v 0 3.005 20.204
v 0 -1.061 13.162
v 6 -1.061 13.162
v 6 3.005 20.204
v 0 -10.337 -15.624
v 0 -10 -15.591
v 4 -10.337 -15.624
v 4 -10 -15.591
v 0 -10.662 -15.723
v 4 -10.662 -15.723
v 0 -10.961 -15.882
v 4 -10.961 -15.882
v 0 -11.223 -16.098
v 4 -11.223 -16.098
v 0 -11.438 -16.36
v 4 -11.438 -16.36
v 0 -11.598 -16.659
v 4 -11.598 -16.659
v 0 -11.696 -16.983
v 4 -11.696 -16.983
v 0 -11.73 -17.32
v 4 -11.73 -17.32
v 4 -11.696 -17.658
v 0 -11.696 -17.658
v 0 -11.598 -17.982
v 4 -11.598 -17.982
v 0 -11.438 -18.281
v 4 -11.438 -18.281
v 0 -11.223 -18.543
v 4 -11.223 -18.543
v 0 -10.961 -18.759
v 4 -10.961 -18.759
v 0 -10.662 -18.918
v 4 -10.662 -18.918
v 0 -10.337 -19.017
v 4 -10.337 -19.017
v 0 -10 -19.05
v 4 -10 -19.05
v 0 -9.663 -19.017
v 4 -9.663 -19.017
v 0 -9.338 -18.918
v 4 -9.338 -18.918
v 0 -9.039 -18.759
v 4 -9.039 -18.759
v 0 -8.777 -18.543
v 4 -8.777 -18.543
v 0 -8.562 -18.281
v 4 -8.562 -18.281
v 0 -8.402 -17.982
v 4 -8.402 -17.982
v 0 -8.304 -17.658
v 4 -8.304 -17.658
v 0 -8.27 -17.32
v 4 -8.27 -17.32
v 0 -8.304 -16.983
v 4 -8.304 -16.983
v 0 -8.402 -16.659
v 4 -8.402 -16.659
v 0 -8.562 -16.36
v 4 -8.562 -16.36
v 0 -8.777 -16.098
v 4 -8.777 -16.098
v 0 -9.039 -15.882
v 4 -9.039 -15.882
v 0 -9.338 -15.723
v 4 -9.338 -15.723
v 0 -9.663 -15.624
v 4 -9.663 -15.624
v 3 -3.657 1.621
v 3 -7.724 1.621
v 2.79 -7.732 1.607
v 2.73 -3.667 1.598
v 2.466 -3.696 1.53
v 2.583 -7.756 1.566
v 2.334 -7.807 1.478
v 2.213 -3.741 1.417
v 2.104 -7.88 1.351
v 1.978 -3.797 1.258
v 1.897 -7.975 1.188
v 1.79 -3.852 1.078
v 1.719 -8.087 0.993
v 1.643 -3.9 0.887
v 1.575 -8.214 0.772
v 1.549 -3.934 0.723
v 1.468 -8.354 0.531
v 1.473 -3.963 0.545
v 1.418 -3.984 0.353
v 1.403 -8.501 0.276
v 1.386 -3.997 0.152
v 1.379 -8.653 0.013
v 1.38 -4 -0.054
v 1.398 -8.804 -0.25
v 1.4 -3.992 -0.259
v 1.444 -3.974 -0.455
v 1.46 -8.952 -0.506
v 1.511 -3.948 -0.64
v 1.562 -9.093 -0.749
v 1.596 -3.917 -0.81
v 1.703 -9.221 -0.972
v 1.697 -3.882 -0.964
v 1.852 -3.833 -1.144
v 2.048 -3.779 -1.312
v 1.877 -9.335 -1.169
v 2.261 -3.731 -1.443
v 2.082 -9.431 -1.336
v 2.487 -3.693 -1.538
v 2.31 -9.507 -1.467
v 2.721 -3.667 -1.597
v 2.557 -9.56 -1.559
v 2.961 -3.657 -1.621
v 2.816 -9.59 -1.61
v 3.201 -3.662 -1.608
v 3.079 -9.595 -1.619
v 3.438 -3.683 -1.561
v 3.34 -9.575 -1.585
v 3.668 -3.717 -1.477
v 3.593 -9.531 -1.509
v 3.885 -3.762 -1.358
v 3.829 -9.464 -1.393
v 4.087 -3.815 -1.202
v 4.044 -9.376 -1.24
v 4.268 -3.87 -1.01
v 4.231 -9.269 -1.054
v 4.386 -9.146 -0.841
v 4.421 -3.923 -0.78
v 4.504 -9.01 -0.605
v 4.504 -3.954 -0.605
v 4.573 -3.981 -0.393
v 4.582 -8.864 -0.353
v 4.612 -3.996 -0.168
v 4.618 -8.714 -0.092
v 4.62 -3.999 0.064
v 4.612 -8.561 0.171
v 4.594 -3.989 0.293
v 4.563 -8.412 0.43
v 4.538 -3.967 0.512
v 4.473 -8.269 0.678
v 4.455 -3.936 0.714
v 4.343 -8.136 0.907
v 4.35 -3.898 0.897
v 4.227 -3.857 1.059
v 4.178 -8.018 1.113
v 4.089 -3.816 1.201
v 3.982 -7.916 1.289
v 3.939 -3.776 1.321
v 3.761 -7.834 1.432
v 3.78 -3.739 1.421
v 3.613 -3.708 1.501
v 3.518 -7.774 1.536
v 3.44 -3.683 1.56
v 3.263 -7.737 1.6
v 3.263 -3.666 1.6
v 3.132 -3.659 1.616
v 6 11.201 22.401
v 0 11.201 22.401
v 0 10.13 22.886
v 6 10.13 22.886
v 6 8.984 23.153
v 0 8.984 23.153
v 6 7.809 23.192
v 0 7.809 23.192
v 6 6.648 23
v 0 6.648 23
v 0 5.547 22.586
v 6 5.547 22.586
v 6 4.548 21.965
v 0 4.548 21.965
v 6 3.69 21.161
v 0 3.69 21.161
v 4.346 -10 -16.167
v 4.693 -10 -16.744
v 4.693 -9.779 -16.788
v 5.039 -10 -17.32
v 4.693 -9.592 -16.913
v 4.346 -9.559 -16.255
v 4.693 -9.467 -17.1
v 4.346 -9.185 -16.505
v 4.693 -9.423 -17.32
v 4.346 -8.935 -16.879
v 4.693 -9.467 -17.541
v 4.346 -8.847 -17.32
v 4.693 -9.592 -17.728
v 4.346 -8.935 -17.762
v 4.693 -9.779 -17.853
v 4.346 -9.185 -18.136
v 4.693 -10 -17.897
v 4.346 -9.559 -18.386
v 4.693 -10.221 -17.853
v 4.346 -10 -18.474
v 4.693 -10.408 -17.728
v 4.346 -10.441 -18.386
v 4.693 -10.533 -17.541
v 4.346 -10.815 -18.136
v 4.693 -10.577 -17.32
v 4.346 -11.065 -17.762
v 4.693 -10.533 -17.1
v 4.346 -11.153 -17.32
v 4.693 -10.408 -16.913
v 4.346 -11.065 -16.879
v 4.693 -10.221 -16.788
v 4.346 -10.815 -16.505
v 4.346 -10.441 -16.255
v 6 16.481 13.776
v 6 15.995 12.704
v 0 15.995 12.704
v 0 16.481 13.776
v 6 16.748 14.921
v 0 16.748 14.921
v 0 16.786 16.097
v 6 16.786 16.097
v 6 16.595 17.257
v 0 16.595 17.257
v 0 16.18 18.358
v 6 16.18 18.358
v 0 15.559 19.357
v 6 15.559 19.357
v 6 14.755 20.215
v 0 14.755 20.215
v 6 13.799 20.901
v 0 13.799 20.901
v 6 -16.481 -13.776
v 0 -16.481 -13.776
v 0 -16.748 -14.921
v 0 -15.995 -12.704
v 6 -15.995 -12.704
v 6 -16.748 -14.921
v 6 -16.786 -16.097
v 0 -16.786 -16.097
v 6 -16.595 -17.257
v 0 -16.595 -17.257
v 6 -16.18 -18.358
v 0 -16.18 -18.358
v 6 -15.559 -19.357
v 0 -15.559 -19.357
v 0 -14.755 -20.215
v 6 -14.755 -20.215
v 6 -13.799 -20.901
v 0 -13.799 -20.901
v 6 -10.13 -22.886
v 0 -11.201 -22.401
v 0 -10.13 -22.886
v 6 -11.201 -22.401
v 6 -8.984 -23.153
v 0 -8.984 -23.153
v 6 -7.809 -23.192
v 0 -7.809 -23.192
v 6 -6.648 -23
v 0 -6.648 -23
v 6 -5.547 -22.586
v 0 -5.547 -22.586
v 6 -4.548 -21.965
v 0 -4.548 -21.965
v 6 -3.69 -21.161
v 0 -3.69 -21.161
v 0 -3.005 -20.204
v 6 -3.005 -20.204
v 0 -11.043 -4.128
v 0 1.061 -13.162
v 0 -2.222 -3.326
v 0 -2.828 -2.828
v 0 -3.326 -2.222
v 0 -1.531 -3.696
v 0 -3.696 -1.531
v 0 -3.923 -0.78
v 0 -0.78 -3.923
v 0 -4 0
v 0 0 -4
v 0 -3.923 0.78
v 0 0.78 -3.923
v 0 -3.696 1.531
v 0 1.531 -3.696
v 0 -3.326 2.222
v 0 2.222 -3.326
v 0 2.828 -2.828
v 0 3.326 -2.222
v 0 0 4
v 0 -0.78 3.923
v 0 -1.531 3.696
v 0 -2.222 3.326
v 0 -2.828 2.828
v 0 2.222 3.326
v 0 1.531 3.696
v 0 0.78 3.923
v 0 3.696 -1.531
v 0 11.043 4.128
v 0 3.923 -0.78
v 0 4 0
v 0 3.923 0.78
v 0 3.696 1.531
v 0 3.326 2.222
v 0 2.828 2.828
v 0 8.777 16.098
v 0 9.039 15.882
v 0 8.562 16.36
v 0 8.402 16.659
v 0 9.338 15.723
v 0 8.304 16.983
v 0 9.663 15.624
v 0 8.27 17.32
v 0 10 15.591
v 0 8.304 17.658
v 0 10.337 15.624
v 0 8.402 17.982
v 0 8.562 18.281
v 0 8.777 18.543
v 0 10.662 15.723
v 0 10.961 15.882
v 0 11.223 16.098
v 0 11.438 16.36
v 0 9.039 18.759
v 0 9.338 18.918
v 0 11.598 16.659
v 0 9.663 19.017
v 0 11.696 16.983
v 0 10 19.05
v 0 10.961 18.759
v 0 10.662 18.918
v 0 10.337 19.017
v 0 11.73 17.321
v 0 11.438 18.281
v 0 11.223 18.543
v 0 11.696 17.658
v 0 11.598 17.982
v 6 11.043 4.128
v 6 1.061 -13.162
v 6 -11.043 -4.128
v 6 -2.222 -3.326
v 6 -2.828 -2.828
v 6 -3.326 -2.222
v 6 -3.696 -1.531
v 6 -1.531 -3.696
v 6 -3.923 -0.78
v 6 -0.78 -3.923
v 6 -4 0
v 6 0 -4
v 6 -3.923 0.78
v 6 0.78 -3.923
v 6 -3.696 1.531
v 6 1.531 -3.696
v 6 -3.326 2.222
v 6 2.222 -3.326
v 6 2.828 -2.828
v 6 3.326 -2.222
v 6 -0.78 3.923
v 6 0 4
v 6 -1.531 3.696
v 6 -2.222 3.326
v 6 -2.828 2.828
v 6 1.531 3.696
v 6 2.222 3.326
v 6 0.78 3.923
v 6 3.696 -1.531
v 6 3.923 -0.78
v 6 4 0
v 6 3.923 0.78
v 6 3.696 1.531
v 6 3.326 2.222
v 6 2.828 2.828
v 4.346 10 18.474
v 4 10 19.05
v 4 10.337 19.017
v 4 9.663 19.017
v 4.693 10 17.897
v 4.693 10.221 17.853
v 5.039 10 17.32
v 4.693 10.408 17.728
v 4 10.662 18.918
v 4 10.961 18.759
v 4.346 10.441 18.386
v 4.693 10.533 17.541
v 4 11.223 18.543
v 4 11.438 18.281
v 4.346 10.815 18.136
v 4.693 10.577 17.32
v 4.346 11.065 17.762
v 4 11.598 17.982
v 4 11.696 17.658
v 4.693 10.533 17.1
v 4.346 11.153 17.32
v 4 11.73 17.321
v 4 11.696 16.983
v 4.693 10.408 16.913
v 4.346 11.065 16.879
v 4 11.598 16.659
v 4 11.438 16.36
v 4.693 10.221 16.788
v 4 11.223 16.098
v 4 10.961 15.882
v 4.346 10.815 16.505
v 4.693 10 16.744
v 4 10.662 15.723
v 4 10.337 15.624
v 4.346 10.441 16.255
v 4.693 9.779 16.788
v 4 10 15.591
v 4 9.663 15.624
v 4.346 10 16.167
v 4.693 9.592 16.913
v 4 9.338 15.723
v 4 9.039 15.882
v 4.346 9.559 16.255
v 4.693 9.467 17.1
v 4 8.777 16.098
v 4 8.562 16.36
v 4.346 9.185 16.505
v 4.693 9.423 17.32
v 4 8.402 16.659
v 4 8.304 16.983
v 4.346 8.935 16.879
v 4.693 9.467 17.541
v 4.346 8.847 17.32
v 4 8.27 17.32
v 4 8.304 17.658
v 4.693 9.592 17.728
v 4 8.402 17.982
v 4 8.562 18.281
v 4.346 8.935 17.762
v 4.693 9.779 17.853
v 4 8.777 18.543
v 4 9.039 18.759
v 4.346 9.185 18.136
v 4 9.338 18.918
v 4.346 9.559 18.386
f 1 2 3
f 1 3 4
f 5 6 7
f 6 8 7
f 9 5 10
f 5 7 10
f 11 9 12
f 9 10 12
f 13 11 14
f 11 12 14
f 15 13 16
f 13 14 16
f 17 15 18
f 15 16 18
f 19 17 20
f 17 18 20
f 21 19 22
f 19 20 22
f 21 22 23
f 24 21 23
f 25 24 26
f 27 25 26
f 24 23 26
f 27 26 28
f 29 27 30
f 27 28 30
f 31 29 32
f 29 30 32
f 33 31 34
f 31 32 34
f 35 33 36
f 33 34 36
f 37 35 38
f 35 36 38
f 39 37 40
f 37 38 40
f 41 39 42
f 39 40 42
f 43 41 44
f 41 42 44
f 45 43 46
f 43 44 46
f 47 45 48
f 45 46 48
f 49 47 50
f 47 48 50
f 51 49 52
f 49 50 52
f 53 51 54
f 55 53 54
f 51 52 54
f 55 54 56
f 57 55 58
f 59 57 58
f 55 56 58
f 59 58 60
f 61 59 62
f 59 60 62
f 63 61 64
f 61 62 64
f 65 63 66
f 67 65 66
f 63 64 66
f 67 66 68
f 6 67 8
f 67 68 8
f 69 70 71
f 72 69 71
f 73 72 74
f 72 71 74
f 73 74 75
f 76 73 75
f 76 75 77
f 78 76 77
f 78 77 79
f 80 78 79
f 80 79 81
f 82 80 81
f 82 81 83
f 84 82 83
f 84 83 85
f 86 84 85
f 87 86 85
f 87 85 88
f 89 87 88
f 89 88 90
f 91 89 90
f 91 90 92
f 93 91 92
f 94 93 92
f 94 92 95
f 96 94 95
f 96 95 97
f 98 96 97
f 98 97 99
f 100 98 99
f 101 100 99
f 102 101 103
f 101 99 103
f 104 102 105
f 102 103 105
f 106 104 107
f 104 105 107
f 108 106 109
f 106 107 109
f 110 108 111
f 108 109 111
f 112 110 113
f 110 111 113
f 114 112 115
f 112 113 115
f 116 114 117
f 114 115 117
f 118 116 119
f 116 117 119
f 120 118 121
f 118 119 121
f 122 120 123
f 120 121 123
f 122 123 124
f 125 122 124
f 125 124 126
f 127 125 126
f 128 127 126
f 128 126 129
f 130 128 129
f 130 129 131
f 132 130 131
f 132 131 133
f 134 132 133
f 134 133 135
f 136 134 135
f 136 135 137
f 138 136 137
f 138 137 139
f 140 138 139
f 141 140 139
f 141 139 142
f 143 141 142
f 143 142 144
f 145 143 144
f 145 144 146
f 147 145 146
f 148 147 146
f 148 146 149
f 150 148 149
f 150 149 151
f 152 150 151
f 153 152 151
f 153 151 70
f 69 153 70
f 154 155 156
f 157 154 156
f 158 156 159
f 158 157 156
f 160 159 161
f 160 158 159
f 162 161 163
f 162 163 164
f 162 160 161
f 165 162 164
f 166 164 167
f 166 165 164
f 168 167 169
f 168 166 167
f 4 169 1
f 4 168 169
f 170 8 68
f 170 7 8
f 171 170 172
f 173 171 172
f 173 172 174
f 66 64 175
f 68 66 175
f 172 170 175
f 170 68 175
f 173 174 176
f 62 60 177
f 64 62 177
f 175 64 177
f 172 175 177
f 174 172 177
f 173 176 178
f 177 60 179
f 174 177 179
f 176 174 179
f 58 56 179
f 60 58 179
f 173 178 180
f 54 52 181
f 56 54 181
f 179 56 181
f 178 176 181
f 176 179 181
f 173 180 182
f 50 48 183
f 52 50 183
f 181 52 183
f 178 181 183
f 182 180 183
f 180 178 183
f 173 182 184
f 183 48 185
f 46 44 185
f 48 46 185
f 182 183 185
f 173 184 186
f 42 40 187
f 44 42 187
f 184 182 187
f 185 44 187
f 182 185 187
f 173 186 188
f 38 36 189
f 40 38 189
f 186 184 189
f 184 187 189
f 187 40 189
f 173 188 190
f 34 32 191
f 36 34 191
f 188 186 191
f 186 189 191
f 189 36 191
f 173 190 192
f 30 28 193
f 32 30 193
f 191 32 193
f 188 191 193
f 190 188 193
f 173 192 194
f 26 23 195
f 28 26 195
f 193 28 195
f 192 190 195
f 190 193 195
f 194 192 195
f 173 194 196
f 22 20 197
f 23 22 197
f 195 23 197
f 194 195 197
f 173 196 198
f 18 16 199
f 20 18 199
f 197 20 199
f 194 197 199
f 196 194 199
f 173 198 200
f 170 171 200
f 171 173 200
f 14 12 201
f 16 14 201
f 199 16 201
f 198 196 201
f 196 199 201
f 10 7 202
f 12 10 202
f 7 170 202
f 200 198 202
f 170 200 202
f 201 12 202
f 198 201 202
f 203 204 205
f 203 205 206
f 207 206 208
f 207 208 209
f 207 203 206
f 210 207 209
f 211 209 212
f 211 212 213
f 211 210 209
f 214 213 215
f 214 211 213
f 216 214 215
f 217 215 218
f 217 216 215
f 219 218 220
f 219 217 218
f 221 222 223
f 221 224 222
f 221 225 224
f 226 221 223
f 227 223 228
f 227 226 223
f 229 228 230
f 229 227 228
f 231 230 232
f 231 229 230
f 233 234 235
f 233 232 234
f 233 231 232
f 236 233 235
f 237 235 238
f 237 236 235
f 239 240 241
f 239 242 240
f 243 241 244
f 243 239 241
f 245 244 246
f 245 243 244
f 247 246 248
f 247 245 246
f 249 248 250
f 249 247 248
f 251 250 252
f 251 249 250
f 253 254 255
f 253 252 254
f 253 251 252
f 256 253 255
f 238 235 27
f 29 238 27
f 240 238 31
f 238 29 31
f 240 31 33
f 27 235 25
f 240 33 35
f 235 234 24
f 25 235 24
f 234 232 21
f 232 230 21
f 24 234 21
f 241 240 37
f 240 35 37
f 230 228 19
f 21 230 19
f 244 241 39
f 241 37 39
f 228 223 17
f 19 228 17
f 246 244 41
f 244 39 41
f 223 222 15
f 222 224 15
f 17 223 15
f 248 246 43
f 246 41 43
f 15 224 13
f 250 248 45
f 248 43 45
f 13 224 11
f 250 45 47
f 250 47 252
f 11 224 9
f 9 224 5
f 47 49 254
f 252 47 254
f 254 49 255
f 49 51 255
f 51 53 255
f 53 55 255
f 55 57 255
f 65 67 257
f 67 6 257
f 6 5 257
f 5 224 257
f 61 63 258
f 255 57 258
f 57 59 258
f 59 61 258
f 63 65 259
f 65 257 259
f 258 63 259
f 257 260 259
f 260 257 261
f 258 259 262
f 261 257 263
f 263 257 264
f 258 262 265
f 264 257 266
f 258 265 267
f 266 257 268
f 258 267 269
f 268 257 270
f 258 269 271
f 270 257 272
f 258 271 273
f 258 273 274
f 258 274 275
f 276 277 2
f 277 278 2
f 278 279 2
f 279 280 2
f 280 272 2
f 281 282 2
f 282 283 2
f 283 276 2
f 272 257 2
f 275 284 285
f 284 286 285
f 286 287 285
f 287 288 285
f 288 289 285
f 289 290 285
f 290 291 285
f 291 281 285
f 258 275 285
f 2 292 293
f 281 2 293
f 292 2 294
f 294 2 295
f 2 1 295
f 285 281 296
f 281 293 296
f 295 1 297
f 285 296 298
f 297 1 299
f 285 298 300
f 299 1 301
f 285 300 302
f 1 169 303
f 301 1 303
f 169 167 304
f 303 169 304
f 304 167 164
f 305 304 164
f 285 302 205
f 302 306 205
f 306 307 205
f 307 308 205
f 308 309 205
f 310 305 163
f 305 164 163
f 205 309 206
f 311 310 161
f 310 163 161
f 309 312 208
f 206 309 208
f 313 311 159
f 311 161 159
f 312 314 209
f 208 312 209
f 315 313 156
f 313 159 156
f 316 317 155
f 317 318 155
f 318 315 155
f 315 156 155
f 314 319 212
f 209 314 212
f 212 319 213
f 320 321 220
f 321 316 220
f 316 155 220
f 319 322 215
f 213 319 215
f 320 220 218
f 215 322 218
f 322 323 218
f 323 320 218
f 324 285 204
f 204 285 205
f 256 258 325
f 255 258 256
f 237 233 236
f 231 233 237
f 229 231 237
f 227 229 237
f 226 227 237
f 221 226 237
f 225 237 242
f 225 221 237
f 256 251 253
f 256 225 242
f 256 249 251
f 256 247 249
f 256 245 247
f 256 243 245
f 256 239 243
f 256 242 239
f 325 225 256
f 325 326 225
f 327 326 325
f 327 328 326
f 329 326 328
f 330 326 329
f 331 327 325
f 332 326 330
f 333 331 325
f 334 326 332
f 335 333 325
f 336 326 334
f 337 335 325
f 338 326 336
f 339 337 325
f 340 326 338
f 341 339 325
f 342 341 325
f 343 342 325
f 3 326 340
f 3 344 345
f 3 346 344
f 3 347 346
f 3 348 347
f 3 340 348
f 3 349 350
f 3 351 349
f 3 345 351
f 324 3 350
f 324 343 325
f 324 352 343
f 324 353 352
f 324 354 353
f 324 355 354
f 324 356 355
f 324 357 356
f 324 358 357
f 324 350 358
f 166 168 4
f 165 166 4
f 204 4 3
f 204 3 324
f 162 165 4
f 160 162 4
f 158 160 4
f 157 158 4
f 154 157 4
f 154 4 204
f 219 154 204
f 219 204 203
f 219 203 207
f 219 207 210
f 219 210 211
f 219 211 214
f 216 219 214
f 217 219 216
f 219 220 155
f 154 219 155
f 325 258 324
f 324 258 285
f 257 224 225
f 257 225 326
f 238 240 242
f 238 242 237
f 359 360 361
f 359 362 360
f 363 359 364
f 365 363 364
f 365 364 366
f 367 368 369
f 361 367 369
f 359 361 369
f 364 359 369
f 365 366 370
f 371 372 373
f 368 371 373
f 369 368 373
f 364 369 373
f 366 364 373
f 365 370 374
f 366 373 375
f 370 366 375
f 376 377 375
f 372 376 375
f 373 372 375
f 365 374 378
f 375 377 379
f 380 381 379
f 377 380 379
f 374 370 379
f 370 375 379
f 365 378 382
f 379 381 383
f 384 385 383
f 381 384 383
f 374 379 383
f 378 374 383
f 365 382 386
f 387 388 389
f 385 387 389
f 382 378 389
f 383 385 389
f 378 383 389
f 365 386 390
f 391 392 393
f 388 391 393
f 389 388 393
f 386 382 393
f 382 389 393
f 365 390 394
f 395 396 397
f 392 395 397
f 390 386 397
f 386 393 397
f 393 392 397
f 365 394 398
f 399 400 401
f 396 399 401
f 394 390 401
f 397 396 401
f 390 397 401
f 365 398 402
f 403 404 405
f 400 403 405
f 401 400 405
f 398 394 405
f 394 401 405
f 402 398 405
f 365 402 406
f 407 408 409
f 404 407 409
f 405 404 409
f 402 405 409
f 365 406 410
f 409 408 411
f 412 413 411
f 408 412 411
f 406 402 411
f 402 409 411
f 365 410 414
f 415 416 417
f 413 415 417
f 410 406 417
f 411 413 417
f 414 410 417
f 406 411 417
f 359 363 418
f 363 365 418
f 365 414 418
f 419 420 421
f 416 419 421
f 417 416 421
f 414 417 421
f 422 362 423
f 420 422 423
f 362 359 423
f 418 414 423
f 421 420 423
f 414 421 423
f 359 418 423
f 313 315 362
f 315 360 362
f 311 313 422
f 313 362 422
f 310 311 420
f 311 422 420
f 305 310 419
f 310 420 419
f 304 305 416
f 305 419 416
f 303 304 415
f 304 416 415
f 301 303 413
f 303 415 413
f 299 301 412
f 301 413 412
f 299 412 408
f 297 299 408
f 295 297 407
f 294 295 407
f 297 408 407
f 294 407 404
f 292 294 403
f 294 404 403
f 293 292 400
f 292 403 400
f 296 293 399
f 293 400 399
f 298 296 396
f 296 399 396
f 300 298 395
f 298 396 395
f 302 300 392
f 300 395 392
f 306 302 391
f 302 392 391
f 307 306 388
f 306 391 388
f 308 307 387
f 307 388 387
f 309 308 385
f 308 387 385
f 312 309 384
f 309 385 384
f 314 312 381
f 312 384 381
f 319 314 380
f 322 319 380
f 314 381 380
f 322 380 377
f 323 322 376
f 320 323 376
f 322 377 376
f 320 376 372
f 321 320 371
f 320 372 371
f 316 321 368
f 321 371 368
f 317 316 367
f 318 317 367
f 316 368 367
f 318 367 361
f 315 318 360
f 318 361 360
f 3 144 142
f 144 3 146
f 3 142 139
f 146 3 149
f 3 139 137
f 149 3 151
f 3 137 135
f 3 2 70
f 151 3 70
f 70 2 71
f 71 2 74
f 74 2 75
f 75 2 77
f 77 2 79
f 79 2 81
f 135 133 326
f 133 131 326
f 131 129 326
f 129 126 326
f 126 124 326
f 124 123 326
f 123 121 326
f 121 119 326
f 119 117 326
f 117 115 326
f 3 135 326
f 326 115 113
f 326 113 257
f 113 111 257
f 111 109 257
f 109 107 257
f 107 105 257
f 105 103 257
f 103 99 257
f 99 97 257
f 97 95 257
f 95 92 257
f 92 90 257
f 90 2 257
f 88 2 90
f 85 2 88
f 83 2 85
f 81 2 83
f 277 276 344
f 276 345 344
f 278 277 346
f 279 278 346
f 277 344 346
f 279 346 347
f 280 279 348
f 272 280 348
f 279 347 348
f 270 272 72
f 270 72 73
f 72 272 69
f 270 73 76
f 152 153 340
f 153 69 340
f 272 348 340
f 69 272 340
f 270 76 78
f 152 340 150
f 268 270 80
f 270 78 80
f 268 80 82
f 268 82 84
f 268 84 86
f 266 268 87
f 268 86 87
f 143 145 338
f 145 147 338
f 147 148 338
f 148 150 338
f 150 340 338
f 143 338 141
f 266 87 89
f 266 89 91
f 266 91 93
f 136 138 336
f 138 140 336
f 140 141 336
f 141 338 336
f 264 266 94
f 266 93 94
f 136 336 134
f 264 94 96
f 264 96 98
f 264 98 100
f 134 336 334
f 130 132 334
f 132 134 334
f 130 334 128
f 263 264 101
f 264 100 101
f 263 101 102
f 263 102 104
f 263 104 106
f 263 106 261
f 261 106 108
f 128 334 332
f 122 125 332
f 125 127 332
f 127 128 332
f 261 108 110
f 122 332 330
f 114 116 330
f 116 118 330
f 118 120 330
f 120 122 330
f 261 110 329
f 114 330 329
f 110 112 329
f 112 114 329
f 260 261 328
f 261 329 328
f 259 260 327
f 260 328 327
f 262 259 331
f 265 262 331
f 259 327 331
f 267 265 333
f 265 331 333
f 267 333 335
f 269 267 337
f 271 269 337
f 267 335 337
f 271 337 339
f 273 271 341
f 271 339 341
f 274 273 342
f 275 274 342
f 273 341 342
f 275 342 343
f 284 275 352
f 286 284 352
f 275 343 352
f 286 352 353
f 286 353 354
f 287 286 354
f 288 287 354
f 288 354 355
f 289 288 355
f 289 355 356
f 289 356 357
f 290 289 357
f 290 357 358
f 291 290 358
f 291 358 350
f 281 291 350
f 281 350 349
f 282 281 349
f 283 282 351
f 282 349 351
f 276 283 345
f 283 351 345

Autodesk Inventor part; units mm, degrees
ref_plane "YZ Plane" through (0, 0, 0) normal (1, 0, 0) x (0, 1, 0)
ref_plane "XZ Plane" through (0, 0, 0) normal (0, 1, 0) x (-1, 0, 0)
ref_plane "XY Plane" through (0, 0, 0) normal (0, 0, 1) x (1, 0, 0)
sketch "Sketch1" plane through (0, 0, 0) normal (1, 0, 0) x (0, 1, 0)
  line L0 (1.0612, -13.162) -> (11.0434, 4.1278)
  line L1 (-1.0612, 13.162) -> (-11.0434, -4.1278)
  line L2 (6.0523, -4.5171) -> (-6.0523, 4.5171) construction
  line L3 (-26.5933, 0) -> (26.5933, 0) construction
  line L4 (0, -35.5609) -> (0, 35.5609) construction
  line L5 (11.0434, 4.1278) -> (18.9952, 17.9006)
  line L6 (18.9952, 17.9006) -> (6.0048, 25.4006)
  line L7 (-1.0612, 13.162) -> (6.0048, 25.4006)
  line L8 (1.0612, -13.162) -> (-6.0048, -25.4006)
  line L9 (-6.0048, -25.4006) -> (-18.9952, -17.9006)
  line L10 (-18.9952, -17.9006) -> (-11.0434, -4.1278)
  point P0 (0, 0)
  dimension "d1" = 15
  dimension "d2" = 50
  dimension "d4" = 60
extrude "Extrusion1" add sketch "Sketch1" along normal blind 6
sketch "Sketch2" plane through (0, 0, 0) normal (-1, 0, 0) x (0, 0, 1)
  point P0 (0, 0)
hole "Hole1" at (0, 0, 0) direction (1, 0, 0) diameter 8 end through all
sketch "Sketch3" plane through (0, 0, 0) normal (0, 1, 0) x (-1, 0, 0)
  line L0 (-6, -25.4006) -> (-6, 17.9006) construction
  line L1 (0, -25.4006) -> (0, 17.9006) construction
  line L2 (1.2, 0) -> (-7.2, 0) construction
  line L3 (0, 0) -> (-6, 0) construction
  point P0 (-6, -17.5083)
  point P1 (-6, 5.0083)
  point P2 (0, 5.0083)
  point P3 (0, -17.5083)
  point P4 (-3, 0)
  point P5 (-3, 0)
hole "Hole2" at (3, 0, 0) direction (0, -1, 0) diameter 3.242 end through all thread size "M4x0.7" class "6H" standard "ISO Metric profile"
sketch "Sketch4" plane through (0, 0, 0) normal (-1, 0, 0) x (0, 0, 1)
  circle A0 centre (0, 0) radius 4 construction
  line L0 (-25.4006, -6.0048) -> (17.9006, 18.9952) construction
  line L1 (25.4006, 6.0048) -> (-17.9006, -18.9952) construction
  line L2 (-26.825, -15.4874) -> (32.6029, 18.8233) construction
  line L3 (7.5083, 12.9952) -> (-15.0083, -0.0048) construction
  line L4 (-17.9006, -18.9952) -> (-25.4006, -6.0048) projected
  line L5 (17.9006, 18.9952) -> (25.4006, 6.0048) projected
  point P0 (5.0083, 17.3253)
  point P1 (-17.5083, 4.3253)
  point P2 (17.3205, 10)
  point P3 (-17.3205, -10)
  dimension "d21" = 20
  dimension "d22" = 20
hole "Hole3" at (0, 10, 17.3205) at (0, -10, -17.3205) direction (1, 0, 0) diameter 3.459 depth 4 tip angle 118 thread size "M4x0.5" class "6H" standard "ISO Metric profile"
fillet "Fillet1" radius 6 4 edges at (3, 18.9952, 17.9006) (3, 6.0048, 25.4006) (3, -6.0048, -25.4006) (3, -18.9952, -17.9006)
